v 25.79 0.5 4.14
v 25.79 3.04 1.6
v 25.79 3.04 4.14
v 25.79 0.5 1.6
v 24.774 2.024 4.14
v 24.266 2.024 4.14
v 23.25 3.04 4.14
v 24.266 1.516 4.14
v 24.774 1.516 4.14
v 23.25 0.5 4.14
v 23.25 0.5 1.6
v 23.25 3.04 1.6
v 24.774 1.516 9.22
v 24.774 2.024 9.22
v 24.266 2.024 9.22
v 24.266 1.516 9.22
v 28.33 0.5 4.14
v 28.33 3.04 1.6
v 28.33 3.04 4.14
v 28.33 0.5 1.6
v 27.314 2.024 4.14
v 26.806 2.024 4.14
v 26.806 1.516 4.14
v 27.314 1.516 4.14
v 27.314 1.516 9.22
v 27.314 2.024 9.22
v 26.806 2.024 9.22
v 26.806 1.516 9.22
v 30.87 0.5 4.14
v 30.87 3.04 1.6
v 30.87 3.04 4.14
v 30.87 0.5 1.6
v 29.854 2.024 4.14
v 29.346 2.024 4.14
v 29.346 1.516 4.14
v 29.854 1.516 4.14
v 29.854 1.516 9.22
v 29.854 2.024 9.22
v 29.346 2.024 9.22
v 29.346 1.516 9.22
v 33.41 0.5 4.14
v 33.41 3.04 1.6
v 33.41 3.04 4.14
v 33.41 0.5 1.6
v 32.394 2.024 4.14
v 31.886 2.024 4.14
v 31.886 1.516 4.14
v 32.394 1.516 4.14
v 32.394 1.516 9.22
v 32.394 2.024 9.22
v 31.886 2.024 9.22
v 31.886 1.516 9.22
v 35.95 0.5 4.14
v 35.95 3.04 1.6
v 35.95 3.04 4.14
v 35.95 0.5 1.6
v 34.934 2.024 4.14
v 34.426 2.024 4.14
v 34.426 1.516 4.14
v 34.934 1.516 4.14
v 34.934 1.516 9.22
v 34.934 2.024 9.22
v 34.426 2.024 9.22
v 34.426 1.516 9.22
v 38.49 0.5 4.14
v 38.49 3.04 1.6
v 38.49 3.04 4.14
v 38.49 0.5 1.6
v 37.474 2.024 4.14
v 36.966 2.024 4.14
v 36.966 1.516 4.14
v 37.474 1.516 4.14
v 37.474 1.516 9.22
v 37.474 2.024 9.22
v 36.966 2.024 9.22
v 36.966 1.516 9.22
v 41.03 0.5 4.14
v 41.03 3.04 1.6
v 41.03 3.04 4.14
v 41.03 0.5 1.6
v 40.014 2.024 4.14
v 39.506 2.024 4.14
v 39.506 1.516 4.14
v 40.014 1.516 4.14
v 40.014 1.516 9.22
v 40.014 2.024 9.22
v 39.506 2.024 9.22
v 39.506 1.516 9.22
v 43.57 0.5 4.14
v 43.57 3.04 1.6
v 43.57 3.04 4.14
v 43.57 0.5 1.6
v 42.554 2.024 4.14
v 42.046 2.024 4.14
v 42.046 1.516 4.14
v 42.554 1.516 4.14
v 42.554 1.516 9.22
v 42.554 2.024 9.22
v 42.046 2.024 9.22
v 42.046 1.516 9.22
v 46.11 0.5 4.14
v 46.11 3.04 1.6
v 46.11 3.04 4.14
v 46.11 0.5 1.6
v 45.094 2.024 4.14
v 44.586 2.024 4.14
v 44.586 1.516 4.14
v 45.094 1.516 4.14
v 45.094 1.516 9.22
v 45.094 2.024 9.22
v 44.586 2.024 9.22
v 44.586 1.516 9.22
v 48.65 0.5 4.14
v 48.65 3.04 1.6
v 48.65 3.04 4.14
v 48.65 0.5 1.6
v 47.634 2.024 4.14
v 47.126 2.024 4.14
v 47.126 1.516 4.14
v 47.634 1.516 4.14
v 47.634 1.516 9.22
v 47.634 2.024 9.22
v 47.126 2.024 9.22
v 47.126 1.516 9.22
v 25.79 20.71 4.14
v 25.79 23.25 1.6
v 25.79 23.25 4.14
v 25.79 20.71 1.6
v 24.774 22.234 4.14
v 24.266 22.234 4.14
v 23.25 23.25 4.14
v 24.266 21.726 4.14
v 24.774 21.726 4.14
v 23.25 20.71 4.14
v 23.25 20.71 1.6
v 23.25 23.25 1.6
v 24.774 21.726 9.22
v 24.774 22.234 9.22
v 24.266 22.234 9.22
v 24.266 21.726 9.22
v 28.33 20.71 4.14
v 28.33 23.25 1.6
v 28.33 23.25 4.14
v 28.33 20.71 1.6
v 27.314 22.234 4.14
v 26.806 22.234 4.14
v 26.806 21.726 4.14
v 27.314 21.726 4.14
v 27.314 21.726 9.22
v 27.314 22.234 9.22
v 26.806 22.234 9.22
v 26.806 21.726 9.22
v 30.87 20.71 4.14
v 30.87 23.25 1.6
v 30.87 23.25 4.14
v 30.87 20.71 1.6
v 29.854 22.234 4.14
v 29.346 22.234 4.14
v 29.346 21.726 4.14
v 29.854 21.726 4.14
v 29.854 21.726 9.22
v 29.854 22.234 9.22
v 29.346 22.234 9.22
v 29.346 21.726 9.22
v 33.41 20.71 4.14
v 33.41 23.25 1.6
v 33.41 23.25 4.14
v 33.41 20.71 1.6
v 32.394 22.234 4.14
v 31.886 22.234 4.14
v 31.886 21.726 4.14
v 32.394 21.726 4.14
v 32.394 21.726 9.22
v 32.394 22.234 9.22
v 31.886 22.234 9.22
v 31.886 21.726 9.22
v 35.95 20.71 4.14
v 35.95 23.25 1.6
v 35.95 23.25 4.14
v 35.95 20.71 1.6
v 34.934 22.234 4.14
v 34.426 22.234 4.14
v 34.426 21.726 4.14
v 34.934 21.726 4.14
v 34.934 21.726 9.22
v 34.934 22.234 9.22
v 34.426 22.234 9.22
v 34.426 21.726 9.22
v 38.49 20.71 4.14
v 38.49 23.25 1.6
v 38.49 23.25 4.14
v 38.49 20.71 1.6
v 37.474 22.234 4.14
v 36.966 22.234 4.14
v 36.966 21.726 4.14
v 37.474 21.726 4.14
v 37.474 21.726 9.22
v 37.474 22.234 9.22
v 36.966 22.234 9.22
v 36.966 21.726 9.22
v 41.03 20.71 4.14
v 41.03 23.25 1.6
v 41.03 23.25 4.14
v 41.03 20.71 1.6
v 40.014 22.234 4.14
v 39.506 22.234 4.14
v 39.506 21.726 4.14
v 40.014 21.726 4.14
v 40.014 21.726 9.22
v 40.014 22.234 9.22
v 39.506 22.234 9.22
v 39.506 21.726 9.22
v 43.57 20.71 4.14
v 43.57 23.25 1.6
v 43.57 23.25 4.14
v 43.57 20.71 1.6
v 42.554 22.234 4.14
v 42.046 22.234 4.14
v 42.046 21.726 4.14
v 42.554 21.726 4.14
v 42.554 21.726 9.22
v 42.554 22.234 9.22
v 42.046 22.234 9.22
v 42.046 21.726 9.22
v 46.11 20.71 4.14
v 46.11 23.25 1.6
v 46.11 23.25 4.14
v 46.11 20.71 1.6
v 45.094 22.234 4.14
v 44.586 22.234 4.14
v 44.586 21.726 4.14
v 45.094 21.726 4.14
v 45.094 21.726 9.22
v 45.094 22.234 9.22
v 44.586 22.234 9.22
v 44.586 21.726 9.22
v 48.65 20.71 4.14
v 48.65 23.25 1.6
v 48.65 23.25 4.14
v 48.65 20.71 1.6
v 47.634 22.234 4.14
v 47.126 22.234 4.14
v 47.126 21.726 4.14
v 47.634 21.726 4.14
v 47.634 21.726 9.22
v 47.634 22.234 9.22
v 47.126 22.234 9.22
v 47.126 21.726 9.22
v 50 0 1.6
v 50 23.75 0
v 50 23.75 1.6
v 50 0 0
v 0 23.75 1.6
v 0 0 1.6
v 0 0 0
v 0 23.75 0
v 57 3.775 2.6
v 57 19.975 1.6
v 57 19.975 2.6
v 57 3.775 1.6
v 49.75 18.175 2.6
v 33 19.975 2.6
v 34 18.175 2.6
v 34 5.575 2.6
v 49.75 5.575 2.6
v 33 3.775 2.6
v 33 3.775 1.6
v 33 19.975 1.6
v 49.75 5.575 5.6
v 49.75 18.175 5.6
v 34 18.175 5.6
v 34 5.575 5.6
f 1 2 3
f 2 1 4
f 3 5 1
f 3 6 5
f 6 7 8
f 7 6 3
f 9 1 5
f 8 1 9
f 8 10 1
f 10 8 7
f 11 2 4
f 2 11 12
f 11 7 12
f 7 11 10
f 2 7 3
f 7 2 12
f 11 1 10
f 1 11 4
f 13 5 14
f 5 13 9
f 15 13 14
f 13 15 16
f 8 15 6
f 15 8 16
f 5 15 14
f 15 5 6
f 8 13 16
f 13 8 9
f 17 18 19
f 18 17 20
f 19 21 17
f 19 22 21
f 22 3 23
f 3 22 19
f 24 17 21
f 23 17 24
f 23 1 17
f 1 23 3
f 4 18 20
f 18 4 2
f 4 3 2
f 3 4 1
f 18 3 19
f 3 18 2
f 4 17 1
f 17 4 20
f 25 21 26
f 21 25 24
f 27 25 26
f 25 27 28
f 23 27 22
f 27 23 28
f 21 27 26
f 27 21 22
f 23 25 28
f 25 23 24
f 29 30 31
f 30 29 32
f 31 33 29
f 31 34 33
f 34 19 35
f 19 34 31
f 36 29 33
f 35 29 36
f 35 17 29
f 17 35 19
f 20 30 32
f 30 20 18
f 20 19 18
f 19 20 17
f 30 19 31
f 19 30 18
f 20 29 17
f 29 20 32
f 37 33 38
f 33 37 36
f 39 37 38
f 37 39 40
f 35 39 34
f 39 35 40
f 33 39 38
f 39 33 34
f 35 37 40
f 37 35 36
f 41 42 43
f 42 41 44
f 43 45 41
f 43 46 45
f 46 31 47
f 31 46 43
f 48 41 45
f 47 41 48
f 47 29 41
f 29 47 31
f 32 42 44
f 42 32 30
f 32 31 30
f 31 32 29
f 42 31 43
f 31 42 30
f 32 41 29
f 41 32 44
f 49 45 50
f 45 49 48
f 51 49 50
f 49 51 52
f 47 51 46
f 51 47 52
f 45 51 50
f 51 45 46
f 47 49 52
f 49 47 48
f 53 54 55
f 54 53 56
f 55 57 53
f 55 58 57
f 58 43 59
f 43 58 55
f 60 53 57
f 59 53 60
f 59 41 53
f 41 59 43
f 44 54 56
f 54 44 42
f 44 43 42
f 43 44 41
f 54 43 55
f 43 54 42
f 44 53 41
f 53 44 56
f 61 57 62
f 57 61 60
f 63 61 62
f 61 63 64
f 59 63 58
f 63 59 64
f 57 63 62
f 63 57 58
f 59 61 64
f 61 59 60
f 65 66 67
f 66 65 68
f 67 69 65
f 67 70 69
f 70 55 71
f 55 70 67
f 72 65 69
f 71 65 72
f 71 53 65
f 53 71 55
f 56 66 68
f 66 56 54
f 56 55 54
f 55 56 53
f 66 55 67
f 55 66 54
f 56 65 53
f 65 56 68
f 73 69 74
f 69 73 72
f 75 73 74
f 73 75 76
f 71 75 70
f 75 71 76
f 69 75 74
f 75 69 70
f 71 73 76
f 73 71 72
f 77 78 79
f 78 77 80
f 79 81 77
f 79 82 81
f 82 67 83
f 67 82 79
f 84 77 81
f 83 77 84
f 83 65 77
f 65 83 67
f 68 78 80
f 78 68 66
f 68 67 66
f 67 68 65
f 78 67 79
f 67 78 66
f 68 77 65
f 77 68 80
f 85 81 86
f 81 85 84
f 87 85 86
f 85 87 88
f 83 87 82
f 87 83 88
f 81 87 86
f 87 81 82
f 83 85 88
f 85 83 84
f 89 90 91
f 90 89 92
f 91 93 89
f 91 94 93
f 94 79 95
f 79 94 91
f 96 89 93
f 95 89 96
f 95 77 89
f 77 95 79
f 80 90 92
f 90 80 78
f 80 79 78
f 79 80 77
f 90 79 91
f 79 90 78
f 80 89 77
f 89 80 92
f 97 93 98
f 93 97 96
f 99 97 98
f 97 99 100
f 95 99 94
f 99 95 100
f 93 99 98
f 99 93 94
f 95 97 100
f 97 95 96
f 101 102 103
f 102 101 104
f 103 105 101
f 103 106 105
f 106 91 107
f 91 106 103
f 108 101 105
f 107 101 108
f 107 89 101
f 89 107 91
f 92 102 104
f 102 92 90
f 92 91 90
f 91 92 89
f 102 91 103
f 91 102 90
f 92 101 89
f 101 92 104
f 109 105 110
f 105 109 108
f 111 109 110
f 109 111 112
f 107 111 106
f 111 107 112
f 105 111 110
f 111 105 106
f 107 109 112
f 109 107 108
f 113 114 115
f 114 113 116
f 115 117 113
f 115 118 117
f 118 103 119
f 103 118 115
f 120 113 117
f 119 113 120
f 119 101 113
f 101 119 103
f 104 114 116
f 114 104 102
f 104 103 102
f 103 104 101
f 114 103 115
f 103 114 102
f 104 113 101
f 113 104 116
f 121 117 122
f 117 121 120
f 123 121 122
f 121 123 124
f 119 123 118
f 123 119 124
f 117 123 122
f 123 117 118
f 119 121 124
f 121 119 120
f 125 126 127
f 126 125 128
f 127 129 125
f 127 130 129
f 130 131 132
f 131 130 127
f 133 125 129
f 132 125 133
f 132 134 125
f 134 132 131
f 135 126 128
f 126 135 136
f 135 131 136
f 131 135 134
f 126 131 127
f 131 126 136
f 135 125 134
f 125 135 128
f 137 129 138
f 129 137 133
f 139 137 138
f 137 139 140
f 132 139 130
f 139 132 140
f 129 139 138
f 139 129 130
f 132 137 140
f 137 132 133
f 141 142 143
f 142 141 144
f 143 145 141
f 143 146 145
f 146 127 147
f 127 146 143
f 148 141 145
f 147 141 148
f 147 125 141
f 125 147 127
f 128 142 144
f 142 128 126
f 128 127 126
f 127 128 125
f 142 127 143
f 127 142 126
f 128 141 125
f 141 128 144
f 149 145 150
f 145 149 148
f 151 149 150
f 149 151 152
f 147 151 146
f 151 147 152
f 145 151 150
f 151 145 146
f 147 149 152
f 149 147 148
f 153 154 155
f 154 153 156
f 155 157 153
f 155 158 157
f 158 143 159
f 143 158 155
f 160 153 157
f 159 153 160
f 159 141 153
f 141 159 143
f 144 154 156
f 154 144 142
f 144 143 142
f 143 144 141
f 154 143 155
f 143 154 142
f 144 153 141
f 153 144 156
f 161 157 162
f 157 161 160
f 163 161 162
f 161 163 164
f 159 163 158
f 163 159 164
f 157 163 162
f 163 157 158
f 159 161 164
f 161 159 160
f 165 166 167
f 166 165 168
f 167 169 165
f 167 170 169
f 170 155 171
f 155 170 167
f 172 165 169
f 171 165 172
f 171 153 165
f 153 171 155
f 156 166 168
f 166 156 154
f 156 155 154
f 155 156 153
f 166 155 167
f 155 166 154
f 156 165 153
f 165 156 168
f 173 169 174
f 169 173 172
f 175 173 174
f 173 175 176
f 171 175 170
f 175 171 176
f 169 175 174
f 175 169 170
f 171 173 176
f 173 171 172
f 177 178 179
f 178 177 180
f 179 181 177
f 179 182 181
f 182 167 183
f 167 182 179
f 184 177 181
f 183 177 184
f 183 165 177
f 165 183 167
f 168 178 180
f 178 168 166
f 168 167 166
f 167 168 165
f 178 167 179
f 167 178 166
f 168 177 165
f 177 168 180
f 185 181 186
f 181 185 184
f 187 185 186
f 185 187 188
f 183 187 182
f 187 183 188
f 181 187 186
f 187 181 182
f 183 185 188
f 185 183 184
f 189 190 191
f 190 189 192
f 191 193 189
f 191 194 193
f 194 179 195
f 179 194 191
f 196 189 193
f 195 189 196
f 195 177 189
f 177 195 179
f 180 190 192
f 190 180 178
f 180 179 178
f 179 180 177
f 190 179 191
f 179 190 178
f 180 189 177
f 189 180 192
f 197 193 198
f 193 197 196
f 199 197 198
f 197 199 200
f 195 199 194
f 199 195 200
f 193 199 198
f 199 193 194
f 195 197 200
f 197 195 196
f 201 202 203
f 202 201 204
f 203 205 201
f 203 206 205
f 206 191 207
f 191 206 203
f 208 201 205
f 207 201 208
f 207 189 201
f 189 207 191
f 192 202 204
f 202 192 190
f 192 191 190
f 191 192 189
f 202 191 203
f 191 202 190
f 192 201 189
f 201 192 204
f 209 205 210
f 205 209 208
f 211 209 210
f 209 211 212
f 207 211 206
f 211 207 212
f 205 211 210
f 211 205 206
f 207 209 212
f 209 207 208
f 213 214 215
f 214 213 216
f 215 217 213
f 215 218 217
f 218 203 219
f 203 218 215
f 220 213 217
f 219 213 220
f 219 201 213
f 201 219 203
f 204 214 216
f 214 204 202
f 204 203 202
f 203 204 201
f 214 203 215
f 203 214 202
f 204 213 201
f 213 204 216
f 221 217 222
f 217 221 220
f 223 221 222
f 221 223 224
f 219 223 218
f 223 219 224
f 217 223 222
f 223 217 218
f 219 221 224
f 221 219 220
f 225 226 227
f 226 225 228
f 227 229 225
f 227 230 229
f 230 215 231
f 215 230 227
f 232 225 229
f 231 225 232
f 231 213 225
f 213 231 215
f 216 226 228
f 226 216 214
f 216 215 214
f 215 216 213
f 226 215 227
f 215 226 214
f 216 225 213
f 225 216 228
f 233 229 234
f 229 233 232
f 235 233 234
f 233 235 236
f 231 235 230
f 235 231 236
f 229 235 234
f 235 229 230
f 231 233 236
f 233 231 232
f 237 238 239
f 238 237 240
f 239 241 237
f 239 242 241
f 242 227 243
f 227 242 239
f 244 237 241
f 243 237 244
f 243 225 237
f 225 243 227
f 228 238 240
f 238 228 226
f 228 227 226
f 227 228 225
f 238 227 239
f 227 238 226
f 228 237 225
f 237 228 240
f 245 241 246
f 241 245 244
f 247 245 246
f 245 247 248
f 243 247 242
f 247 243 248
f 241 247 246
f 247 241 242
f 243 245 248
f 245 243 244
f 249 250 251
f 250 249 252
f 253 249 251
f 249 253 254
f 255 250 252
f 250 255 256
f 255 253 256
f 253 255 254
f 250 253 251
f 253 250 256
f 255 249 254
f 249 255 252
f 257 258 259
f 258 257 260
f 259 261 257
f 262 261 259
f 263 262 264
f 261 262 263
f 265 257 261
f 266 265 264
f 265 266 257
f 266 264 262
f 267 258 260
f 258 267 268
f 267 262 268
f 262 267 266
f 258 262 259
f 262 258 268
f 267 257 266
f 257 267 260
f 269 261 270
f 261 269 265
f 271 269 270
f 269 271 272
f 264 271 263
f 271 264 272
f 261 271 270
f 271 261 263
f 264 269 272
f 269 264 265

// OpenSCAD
// file: common.scad
// A library of common modules, functions and variables

// Extra dimension to remove ambiguity of walls
ex = 0.001;

// Hole dimension correction - if 3D printed holes turn out too small,
// increase the value (e.g. 1.1 = 110%), or reduce the value (e.g. 0.9 = 90%).
// Default value is 1.0 (100%)
hdc = 1.1;

// Some nuts and bolts dimensions
m3_bolt_head_dia = 6*hdc;
m3_bolt_head_height = 2;
m3_dia = 3*hdc;


module rounded_rect(x, y, z, radius = 1) {
    // Draws a rounded rectangle
    translate([radius,radius,0]) //move origin to outer limits
	linear_extrude(height=z)
		minkowski() {
			square([x-2*radius,y-2*radius]); //keep outer dimensions given by x and y
			circle(r = radius, $fn=100);
		}
}


module cylinder_quarter(r, h){
    // Draws quarter of a cylinder
    difference(){
        cylinder(r=r, h=h);
        translate ([-r-ex, -r-ex, -ex]) cube([2*r + 2*ex, r + ex, h + 2*ex]);
        translate ([-r-ex, -ex, -ex]) cube([r + ex, r + ex, h + 2*ex]);
    }
}


module header_pin(rows=1, columns=1){
    // Draws 2.54 mm male header pins
    base_width = 2.54;
    base_height = 2.54;
    header_width = 0.508;
    header_height = 5.08;
    trans = base_width/2 - header_width/2;

    for (i = [0: rows - 1]){
        for (j = [0: columns -1]){
            translate([j*base_width, i*base_width, 0]){
                color("Black") cube([base_width, base_width, base_height]);
                translate([trans , trans, base_height])
                    color("Khaki") cube([header_width, header_width, header_height]);
            }
        }
    }

}

module m3_bolt(length = 10){
    // M3 bolt mockup
    union(){
        cylinder(d = m3_dia, h = length);
        translate([0, 0, length - ex - m3_bolt_head_height]) 
            cylinder(d = m3_bolt_head_dia, h = m3_bolt_head_height + ex);
    }
}

module m3_nut_trap(){
    // Makes M3 nut trap inset
    cylinder(r=5.5/2/cos(180/6)*hdc, h=2, $fn=6);
}
// main file
// Croduino NOVA 3D model by Mikrotron d.o.o.

include <common.scad>;

// Board dimensions
nova_length = 50.0;
nova_width = 23.75;
nova_height = 1.6;

// ESP8266 module board dimensions and position
esp_length = 24.0;
esp_width = 16.2;
esp_height = 1.0;
esp_m_length = 15.75;
esp_m_width = 12.6;
esp_m_height = 3.0;
esp_x = 57.0 - esp_length;

// Headers positions
header_x = nova_length - 26.75;
header_y = 0.5;

// Entry point, uncomment the line bellow to see the object
croduino_nova();

module croduino_nova(){
    nova_board();
    translate([esp_x, nova_width/2 - esp_width/2, nova_height]) esp_board();
}

module nova_board(){
    // Draw Croduino NOVA board
    color("SteelBlue") cube([nova_length, nova_width, nova_height]);
    // Add headers
    translate([header_x, header_y, nova_height]) header_pin(1,10);
    translate([header_x, nova_width - header_y - 2.54, nova_height]) header_pin(1,10);
}

module esp_board(){
    // Draw ESP8266 module board
    color("Teal") cube([esp_length, esp_width, esp_height]);
    // Draw ESP8266 module
    translate([1, esp_width/2 - esp_m_width/2, esp_height])
        color("Ivory") cube([esp_m_length, esp_m_width, esp_m_height]);
}
